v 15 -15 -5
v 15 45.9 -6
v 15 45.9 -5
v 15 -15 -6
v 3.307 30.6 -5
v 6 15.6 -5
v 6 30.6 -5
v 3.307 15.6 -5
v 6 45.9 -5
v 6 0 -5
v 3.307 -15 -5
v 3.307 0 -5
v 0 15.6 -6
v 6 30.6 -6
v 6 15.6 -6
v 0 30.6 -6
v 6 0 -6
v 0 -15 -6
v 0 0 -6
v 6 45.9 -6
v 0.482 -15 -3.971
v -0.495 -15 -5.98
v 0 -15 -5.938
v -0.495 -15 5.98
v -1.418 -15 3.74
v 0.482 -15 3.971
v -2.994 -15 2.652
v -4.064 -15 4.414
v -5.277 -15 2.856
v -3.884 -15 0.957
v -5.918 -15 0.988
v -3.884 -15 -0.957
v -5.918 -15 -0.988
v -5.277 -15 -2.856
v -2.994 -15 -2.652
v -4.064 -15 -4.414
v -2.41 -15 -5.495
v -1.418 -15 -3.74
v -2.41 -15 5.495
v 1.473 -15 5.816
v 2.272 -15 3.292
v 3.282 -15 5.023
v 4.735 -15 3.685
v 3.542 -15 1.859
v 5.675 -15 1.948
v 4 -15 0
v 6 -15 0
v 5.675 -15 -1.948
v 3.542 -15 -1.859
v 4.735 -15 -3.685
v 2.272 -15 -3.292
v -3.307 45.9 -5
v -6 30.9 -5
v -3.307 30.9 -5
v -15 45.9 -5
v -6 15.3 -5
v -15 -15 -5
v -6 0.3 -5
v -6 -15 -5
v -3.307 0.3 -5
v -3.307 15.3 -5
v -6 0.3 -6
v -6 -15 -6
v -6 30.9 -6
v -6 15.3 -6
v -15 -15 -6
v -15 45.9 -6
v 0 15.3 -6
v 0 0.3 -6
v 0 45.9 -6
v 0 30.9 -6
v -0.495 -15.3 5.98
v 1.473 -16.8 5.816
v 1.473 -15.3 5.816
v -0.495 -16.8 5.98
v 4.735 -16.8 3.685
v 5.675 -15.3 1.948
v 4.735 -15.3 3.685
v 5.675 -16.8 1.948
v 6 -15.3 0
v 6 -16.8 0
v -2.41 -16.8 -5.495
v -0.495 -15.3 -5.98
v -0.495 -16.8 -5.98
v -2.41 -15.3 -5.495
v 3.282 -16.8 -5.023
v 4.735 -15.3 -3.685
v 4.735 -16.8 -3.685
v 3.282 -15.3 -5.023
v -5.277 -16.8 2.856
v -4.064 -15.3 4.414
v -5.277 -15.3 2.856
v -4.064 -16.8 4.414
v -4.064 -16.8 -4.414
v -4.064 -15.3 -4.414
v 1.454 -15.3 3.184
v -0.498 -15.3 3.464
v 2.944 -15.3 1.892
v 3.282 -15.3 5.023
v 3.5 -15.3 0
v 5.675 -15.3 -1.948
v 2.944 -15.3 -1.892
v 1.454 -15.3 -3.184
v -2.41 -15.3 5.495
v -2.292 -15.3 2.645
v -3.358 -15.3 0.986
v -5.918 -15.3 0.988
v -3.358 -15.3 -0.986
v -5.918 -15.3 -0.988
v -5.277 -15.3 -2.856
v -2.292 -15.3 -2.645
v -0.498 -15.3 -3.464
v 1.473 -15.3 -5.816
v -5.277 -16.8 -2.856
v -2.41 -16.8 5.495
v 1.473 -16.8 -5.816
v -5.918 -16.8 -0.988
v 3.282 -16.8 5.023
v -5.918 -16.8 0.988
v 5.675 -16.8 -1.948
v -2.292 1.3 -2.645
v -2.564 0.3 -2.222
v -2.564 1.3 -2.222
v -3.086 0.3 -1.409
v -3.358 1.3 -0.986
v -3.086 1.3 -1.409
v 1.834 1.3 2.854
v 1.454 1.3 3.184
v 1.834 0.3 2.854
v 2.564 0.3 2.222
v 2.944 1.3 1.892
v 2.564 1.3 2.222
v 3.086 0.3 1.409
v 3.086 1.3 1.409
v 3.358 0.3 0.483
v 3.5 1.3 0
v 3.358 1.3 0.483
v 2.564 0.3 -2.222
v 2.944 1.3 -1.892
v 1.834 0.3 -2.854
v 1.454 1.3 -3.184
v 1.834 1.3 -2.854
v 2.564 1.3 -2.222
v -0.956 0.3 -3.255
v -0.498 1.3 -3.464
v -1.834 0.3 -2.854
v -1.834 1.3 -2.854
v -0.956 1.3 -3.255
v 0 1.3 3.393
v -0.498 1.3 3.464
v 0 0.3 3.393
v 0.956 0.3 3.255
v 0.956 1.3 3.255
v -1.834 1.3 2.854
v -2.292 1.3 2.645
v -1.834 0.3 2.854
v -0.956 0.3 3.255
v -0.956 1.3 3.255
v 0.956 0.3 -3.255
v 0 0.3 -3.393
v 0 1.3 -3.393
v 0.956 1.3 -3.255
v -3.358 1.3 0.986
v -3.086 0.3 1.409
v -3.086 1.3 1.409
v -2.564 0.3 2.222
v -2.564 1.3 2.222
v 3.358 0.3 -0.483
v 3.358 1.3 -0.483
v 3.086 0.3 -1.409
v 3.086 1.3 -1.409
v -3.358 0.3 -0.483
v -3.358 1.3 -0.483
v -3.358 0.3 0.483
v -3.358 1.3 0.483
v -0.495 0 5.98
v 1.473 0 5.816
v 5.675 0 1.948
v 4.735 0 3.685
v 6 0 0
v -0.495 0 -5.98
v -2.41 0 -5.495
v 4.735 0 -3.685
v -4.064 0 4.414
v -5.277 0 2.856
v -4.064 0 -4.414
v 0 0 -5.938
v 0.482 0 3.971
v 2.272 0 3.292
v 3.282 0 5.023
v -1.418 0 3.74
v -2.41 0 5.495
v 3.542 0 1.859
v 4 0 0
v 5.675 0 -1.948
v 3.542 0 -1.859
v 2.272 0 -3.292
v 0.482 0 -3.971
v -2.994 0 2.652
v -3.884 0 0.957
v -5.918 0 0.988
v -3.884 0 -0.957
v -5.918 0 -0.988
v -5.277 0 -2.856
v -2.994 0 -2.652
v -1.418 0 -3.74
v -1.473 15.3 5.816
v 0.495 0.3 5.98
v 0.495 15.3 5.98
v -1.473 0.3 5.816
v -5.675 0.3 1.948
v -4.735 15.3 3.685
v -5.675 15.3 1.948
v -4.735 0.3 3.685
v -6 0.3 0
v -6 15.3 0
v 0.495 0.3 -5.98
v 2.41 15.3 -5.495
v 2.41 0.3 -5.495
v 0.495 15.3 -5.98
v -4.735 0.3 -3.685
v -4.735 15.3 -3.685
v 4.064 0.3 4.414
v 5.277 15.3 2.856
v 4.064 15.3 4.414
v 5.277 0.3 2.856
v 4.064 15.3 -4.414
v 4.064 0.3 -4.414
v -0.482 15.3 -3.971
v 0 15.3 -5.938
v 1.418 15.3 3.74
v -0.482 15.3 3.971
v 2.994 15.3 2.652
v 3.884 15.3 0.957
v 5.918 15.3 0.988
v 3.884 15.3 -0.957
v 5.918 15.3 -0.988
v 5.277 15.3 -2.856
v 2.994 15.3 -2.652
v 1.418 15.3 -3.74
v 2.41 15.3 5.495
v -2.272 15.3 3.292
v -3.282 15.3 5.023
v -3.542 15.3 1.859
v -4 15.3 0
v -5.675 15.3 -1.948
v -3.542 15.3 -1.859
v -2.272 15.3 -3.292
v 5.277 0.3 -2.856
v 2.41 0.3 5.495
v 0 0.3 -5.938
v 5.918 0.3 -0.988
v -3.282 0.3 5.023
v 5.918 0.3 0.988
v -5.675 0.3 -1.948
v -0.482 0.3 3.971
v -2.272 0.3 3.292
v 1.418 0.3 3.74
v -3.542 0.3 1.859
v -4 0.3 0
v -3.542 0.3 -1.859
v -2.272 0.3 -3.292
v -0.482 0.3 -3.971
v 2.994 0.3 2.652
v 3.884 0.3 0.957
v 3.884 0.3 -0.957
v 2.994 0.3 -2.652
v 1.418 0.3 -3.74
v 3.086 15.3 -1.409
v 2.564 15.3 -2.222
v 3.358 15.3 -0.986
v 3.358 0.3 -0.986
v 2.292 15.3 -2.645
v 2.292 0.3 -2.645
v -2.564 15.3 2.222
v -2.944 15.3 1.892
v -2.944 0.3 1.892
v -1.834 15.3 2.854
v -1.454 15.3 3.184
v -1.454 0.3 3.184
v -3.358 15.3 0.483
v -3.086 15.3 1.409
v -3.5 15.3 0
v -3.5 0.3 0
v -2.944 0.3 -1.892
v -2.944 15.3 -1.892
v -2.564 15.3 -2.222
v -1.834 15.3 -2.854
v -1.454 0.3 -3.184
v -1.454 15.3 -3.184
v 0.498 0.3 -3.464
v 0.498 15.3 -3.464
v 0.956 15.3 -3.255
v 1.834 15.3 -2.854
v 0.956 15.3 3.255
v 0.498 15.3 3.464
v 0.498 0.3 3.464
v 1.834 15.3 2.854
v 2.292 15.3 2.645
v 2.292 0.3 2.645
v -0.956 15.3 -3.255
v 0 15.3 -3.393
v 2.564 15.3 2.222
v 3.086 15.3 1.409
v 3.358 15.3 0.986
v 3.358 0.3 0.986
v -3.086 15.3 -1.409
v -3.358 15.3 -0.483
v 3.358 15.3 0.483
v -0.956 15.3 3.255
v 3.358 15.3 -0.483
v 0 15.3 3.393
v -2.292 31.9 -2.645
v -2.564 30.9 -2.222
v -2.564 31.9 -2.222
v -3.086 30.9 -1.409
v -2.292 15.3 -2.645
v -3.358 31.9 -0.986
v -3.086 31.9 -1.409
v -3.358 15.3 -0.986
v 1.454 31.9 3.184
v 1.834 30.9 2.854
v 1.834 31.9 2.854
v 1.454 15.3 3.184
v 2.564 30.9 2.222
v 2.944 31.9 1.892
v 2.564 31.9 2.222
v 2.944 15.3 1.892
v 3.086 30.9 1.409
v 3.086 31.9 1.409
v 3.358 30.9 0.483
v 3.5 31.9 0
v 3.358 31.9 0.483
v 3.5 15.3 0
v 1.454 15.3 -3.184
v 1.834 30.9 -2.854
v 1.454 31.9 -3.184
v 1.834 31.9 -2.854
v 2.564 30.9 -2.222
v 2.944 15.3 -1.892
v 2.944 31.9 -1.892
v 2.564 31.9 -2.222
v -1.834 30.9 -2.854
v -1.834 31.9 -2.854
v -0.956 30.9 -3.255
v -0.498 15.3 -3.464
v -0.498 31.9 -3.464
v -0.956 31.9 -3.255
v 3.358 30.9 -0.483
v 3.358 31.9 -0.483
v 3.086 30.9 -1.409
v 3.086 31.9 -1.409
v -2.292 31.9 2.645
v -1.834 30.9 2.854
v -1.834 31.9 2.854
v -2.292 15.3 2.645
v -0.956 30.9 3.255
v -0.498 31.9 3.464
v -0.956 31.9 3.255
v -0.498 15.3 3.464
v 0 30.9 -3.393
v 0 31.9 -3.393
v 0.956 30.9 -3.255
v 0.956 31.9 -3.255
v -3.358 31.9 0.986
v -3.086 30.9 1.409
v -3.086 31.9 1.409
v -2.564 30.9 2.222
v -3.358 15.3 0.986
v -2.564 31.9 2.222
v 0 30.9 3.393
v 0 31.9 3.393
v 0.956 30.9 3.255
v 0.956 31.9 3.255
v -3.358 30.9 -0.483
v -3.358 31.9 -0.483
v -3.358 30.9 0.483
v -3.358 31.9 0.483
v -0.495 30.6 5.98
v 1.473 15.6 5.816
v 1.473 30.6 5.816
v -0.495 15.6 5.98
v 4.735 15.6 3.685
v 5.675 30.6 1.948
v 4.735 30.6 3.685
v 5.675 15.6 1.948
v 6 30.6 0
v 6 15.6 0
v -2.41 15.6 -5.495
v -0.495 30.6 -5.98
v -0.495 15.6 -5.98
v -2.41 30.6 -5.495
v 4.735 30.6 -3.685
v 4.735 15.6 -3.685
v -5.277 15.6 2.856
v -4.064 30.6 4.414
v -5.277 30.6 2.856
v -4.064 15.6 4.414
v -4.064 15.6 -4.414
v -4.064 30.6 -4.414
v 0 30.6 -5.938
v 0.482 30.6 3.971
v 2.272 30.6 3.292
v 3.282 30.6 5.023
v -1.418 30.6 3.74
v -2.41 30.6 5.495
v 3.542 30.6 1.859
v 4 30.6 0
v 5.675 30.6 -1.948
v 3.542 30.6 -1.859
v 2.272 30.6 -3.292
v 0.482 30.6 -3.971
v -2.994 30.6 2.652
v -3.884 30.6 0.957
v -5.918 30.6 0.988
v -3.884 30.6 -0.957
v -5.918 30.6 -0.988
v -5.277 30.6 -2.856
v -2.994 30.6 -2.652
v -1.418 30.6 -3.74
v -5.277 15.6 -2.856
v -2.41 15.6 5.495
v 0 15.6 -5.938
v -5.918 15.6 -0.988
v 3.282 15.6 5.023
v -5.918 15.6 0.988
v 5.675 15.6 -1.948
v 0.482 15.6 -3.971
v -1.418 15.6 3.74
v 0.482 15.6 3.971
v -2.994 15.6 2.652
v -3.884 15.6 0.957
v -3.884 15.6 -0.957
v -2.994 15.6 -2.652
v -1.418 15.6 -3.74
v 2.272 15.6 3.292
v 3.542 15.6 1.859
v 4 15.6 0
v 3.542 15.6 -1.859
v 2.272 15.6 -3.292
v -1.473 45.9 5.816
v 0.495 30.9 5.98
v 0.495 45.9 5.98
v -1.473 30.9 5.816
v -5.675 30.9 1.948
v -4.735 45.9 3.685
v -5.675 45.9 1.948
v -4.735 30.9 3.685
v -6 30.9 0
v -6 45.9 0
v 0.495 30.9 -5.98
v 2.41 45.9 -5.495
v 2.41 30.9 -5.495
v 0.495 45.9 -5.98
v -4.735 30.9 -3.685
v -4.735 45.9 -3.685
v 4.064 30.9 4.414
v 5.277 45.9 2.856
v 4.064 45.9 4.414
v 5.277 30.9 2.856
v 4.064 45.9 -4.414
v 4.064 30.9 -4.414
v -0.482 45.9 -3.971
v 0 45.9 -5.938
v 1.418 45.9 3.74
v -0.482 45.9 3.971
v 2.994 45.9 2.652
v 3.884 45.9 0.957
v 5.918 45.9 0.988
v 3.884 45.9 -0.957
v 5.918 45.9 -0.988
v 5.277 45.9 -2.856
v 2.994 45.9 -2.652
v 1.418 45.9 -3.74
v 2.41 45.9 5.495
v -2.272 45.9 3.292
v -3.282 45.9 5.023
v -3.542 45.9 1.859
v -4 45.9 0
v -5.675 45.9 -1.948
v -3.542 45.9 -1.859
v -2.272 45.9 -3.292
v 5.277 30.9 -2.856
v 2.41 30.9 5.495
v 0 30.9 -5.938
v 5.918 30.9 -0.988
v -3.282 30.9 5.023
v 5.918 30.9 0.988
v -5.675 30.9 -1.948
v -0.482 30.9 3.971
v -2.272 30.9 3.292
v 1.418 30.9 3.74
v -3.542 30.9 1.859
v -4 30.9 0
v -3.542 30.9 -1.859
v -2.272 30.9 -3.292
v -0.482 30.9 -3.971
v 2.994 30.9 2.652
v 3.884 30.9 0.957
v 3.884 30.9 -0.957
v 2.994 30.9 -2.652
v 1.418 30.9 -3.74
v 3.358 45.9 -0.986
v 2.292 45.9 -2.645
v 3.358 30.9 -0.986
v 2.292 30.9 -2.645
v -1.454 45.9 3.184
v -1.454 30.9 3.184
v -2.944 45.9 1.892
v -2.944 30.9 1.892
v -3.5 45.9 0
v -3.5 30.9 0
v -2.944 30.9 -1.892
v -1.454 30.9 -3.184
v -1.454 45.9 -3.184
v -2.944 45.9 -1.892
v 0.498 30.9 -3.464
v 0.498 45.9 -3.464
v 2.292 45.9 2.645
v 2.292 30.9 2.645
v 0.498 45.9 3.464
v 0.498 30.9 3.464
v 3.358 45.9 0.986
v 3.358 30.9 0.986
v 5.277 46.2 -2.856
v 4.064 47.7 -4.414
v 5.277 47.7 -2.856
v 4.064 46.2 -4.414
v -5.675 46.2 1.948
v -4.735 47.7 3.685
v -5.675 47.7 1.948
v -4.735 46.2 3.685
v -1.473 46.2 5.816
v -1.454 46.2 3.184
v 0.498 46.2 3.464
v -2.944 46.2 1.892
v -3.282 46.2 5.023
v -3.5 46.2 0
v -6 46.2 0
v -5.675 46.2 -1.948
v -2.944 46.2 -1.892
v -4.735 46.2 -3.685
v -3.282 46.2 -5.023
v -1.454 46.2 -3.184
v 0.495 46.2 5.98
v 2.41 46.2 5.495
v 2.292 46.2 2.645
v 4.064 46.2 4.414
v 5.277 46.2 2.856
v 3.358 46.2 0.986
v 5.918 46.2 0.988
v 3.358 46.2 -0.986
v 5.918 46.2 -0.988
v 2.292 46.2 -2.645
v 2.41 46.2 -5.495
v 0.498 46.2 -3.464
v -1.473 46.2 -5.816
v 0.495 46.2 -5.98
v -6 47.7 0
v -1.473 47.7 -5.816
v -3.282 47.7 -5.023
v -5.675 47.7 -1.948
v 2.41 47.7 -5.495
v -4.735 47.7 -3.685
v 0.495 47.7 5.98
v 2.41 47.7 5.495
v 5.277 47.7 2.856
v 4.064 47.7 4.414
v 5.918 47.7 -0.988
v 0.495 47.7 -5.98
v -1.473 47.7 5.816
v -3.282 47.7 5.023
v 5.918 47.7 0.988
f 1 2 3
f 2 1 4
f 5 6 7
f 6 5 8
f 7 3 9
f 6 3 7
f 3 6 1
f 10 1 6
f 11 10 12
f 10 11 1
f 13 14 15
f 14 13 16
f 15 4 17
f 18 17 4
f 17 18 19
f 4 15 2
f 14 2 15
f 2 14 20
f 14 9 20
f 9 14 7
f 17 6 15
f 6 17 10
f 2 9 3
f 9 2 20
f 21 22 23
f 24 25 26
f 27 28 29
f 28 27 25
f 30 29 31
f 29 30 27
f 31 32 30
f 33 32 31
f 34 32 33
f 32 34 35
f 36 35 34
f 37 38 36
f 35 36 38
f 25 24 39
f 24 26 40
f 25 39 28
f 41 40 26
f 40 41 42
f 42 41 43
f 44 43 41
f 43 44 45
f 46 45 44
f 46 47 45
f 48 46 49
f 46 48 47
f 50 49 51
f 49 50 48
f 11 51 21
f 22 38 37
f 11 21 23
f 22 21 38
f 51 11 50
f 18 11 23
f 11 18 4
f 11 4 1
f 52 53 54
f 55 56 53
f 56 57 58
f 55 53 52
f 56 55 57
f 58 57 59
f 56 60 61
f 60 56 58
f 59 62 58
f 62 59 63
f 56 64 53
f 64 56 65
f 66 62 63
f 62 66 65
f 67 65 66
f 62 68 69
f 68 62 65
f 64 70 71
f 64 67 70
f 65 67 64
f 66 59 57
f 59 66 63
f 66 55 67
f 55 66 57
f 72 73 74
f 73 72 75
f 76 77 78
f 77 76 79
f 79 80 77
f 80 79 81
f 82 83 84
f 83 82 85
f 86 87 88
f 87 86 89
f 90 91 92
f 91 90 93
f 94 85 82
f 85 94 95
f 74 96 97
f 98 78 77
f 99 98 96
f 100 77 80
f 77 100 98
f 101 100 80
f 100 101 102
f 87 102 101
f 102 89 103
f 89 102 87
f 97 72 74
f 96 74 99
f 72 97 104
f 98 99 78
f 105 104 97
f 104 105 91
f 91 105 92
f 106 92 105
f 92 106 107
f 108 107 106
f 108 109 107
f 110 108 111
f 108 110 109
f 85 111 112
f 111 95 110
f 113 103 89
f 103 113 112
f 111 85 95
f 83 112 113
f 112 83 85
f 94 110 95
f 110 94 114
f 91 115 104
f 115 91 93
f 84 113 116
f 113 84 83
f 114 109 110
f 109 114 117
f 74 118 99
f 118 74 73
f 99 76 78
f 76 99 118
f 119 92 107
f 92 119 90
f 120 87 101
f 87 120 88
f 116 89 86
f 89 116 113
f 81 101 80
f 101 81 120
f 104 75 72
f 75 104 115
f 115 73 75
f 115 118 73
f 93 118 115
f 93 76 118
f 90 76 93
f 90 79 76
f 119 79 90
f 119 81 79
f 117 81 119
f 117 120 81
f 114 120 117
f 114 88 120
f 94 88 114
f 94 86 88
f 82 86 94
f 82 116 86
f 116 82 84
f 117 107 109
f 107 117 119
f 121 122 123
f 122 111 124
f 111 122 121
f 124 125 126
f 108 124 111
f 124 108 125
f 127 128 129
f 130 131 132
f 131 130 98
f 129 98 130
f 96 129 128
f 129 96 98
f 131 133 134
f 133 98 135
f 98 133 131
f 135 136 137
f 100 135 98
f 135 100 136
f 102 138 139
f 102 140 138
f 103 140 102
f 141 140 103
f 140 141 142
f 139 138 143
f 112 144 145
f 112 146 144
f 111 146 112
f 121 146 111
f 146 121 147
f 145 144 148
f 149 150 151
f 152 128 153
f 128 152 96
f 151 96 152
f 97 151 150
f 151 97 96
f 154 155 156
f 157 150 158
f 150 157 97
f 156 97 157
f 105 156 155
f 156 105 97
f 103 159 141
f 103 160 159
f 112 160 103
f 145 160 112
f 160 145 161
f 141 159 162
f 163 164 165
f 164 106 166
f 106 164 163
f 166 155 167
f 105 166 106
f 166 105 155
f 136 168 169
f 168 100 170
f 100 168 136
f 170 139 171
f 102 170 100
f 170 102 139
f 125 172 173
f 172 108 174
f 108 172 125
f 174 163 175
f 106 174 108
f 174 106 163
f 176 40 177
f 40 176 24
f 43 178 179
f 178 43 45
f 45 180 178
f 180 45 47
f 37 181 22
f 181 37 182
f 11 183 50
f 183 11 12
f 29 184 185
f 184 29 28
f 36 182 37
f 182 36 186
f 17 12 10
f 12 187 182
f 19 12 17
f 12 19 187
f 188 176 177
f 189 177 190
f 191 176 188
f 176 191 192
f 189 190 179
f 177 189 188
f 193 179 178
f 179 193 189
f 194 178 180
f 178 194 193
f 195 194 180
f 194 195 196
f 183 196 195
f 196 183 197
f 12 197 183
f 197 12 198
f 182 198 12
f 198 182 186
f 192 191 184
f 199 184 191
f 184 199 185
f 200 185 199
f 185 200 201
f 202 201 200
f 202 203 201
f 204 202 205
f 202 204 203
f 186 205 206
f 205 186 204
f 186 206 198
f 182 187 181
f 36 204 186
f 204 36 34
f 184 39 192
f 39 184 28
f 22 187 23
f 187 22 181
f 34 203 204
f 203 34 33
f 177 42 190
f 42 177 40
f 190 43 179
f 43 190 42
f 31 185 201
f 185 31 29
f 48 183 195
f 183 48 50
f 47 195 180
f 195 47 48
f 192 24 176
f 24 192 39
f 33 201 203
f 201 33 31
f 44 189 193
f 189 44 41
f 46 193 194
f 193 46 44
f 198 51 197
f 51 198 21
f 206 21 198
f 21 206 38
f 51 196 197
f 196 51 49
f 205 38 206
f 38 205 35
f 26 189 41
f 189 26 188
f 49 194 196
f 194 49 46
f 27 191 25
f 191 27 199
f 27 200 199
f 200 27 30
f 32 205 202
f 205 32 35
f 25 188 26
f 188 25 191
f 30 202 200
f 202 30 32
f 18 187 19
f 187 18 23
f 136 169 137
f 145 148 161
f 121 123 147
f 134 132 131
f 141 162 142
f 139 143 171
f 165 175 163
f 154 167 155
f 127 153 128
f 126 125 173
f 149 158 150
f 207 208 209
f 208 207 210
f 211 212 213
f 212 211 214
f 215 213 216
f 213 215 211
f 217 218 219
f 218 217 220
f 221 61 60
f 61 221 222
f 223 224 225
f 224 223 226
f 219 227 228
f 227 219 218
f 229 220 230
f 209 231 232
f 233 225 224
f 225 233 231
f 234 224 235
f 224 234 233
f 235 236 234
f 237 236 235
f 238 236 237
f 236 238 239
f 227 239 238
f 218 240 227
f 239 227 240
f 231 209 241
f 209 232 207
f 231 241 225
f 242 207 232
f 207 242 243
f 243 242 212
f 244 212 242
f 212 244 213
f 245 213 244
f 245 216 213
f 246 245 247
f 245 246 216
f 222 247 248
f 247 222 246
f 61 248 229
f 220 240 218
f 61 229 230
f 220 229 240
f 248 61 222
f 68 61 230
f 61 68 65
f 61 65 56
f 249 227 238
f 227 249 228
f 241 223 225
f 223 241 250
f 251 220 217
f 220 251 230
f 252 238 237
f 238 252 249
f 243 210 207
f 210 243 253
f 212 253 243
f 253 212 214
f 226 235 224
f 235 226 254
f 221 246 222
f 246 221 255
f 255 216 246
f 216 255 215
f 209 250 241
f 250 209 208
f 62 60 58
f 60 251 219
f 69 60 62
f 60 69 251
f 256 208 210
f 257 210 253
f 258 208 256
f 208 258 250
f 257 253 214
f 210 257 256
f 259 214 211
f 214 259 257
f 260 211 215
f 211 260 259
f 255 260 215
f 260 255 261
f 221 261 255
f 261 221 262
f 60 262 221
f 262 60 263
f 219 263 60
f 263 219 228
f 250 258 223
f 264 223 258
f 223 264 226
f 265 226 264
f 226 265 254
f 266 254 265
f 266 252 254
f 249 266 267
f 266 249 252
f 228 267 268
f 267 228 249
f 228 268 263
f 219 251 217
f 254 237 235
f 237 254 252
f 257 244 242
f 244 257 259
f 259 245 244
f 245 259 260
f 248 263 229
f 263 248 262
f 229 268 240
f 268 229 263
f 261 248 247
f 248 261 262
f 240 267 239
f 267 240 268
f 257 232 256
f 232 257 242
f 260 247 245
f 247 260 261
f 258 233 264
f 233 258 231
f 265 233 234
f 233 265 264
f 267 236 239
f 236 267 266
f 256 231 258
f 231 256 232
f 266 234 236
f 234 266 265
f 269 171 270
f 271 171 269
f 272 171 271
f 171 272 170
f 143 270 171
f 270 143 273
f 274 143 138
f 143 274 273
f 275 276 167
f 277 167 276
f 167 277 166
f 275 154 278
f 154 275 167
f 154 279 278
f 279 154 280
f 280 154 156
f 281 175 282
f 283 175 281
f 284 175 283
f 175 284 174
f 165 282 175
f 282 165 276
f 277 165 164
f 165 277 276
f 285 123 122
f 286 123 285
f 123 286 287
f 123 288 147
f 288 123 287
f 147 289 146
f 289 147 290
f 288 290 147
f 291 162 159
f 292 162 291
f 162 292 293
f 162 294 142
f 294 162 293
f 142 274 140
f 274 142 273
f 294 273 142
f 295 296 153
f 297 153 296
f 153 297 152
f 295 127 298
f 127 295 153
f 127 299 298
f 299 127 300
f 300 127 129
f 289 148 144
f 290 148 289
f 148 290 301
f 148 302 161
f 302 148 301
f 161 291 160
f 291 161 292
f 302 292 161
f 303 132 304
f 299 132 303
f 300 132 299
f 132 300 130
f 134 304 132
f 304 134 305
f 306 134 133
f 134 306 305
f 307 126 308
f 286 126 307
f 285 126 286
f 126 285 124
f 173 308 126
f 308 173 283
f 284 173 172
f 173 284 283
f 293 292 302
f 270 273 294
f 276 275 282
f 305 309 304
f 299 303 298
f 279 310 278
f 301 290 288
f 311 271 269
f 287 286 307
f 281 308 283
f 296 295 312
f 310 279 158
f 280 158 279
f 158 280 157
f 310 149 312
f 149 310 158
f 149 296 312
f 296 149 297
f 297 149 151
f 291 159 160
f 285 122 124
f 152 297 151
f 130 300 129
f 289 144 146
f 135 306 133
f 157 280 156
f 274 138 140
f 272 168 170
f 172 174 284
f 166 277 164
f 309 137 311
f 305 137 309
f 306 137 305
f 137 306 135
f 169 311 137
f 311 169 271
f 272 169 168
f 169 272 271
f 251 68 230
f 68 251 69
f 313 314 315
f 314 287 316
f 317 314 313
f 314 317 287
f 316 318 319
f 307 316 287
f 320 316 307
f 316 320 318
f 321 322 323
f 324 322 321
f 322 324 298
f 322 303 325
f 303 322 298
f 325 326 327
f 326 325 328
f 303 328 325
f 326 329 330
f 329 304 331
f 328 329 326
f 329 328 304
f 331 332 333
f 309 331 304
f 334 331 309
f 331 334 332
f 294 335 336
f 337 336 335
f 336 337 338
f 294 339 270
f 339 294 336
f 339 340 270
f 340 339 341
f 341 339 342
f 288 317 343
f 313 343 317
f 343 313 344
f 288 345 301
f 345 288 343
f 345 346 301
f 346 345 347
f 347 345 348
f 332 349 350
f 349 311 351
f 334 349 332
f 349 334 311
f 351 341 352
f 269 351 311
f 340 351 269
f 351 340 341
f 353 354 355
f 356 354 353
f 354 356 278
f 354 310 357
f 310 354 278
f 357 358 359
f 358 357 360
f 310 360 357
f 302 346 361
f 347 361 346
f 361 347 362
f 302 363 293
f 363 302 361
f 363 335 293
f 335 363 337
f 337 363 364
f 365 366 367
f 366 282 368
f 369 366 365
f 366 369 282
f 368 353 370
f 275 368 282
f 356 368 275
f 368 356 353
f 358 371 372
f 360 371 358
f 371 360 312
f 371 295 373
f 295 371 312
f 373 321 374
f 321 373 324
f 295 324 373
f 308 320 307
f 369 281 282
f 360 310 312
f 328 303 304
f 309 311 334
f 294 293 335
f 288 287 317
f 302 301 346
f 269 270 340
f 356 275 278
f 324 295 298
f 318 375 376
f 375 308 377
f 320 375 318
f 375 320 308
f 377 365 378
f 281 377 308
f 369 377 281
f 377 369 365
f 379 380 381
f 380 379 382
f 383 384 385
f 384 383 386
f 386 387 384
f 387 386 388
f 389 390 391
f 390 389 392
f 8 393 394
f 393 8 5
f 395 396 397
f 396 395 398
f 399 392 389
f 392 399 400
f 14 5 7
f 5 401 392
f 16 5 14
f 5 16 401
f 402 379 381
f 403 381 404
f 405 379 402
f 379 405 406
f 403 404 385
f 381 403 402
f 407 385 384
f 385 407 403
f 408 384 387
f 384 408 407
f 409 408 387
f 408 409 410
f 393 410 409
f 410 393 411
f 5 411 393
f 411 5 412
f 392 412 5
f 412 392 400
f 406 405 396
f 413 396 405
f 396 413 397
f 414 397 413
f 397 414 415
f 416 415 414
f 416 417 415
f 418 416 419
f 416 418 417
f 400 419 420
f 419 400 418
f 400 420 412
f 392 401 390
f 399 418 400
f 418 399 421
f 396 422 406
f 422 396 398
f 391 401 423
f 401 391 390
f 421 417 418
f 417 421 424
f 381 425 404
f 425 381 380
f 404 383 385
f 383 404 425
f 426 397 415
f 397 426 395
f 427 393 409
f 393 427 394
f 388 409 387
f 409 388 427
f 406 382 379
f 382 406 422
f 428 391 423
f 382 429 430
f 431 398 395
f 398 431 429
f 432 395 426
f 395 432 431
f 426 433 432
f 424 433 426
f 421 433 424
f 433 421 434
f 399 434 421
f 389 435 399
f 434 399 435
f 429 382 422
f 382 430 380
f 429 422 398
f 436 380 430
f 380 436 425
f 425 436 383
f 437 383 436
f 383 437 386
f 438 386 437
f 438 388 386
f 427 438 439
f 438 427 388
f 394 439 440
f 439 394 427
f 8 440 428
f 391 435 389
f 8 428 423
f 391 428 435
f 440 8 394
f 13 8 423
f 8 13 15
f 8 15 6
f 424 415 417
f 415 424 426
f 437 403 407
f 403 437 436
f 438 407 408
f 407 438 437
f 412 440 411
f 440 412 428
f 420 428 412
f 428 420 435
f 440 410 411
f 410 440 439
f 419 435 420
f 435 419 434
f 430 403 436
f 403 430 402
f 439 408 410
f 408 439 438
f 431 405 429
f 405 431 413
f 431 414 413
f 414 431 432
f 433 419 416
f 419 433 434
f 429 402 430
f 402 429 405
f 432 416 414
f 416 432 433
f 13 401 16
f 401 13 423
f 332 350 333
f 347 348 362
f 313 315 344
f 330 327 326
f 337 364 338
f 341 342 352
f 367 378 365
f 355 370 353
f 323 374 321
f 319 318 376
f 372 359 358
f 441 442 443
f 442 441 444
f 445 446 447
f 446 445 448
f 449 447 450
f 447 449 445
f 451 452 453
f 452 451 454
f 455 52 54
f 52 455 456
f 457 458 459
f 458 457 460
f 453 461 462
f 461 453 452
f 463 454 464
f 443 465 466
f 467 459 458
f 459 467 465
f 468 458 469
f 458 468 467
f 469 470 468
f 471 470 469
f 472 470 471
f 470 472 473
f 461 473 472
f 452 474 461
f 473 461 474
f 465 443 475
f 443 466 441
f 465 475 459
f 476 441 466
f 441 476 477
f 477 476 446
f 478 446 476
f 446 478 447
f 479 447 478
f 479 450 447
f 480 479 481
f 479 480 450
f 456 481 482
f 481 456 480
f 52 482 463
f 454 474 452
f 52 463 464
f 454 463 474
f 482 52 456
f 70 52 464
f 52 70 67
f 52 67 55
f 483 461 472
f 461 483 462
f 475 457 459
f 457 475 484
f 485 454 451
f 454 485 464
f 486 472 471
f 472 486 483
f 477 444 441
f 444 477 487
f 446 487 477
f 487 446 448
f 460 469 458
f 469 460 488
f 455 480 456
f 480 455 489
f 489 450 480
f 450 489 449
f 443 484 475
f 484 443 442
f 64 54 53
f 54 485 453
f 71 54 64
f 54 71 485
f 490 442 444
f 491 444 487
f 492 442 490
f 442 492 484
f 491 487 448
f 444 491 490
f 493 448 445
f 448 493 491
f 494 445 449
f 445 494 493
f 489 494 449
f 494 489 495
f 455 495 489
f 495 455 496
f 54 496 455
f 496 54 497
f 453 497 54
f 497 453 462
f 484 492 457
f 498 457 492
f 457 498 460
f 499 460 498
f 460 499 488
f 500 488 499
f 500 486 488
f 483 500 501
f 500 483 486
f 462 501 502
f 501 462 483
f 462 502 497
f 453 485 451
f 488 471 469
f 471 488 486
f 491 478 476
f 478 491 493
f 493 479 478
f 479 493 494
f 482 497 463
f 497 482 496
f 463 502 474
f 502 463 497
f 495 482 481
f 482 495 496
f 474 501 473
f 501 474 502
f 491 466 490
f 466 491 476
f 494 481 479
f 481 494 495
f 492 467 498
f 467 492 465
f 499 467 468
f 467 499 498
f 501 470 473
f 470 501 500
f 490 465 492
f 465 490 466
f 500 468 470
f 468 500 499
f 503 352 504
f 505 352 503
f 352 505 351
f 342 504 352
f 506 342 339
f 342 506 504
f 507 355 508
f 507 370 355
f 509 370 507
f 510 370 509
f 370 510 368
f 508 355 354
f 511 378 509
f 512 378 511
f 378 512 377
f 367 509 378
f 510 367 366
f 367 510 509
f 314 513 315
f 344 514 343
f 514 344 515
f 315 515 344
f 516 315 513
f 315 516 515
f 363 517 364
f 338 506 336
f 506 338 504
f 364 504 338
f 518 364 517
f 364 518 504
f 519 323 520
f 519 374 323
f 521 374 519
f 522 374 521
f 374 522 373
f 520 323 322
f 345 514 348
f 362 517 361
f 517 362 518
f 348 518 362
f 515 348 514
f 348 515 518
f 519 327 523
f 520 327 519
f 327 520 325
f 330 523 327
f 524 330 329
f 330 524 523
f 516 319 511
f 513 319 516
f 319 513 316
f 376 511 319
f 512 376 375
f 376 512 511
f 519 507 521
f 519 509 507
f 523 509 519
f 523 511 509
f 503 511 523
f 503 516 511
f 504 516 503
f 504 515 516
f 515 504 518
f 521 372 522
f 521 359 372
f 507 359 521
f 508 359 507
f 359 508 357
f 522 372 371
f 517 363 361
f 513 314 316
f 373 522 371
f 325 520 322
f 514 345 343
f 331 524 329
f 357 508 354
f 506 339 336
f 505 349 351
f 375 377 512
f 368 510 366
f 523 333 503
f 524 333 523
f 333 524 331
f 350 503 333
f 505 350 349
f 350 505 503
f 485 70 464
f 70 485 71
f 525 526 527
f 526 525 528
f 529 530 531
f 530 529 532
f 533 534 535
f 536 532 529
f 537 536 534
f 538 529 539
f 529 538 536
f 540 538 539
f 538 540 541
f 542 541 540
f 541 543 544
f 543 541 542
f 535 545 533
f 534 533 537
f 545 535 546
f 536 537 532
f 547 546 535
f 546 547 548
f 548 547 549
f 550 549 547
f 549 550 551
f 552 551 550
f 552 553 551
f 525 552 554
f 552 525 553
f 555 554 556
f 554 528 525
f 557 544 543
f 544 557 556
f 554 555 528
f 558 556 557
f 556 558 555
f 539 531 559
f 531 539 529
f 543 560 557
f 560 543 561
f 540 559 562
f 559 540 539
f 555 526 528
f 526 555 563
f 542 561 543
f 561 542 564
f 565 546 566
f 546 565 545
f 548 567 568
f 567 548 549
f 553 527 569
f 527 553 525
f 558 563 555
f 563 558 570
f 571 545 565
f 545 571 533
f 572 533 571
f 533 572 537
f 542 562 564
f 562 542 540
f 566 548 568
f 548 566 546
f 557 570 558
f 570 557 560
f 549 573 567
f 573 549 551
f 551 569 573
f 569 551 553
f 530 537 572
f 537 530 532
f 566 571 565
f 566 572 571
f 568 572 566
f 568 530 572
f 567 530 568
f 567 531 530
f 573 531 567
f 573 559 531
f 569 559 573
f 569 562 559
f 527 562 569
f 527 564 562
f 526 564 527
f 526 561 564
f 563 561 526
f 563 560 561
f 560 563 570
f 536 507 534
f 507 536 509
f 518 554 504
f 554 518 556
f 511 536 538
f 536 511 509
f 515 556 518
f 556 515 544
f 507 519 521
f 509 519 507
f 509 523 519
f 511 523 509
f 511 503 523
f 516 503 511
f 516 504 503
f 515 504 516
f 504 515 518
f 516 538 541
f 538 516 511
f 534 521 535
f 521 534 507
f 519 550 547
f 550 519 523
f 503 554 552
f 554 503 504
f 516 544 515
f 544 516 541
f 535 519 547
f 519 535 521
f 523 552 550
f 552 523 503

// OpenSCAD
//You can calculate the total length of the hinge with (TabLength * Number of Tabs) + (TabsTolerance * 2) + (TabLength / 5)
NumberOfTabs=4;
TabsTolerance=0.3;
TabLength=15;
//To determine the inner tolerance: OuterRadius - OuterThickness - InnerRadius
OuterRadius=6;
OuterThickness=2;
InnerRadius=3.5;
//Ideally you want TasselThickness to be equal to OuterThickness, but i left it modifiable for odd applications
TasselThickness=1;
TasselLength=15;
//If united is set to 0, the tabs will be linked together, if 1 they will be separated.
United=0;

module hingePart(partLength,outerRadius,outerThickness,innerRadius,tabWidth,tabThickness,tabLength){
    union(){
        difference(){
            rotate([90,0,0]) linear_extrude(height=partLength){
                circle(r=outerRadius);
            }
            rotate([90,0,0]) linear_extrude(height=partLength){
                circle(r=outerRadius-outerThickness);
            }
        }
        rotate([90,0,0]) linear_extrude(height=partLength){
                circle(r=innerRadius);}
        translate([(tabLength/2),-(partLength/2),-outerRadius+(tabThickness/2)]) cube([tabLength,tabWidth,tabThickness],center=true);
    }
}

module hinge(tabsNumber,tabsSpacing,partLength,outerRadius,outerThickness,innerRadius,tabThickness,tabLength,unite){
    tabWidth=partLength;
    for(a=[0:tabsNumber-1]){
        union(){if(a==0){
            if(unite==0){
                color("red",1) translate([(tabLength-((tabLength-outerRadius))),-(partLength),-outerRadius]) cube([tabLength-outerRadius,(tabWidth+tabsSpacing)*tabsNumber-tabsSpacing,tabThickness]);
                mirror(1,0,0) color("red",1) translate([(tabLength-((tabLength-outerRadius))),-(partLength),-outerRadius]) cube([tabLength-outerRadius,(tabWidth+tabsSpacing)*tabsNumber-tabsSpacing,tabThickness]);
            }
            color("blue",1) translate([0,-partLength-tabsSpacing,0]){rotate([90,0,0]) linear_extrude(height=partLength/10){
                circle(r=outerRadius);}
            color("blue",1) translate([0,tabsSpacing+1,0]){rotate([90,0,0]) linear_extrude(height=tabsSpacing+1){
                circle(r=innerRadius);}
             }
         } 
        }
        if(a%2==0){
            translate ([0,(partLength+tabsSpacing)*a,0]) hingePart(partLength,outerRadius,outerThickness,innerRadius,tabWidth,tabThickness,tabLength);
        }
        else{
            translate ([0,(partLength+tabsSpacing)*a,0]) mirror([1,0,0]) hingePart(partLength,outerRadius,outerThickness,innerRadius,tabWidth,tabThickness,tabLength);
        }
        if(a!=tabsNumber-1){
            color("red",1) translate ([0,(tabsSpacing+1+((partLength+tabsSpacing)*a)),0]) rotate([90,0,0]) linear_extrude(height=tabsSpacing+1){
                circle(r=innerRadius);} 
        }
        else{
            color("blue",1) translate([0,partLength*a+(tabsSpacing*(a+1)),0]){rotate([90,0,180]) linear_extrude(height=partLength/10){
                circle(r=outerRadius);}
            translate([0,-tabsSpacing,0]){rotate([90,0,180]) linear_extrude(height=tabsSpacing+1){
                circle(r=innerRadius);}
             }
         } 
        }
    }}
}


hinge(NumberOfTabs,TabsTolerance,TabLength,OuterRadius,OuterThickness,InnerRadius,TasselThickness,TasselLength,United);
